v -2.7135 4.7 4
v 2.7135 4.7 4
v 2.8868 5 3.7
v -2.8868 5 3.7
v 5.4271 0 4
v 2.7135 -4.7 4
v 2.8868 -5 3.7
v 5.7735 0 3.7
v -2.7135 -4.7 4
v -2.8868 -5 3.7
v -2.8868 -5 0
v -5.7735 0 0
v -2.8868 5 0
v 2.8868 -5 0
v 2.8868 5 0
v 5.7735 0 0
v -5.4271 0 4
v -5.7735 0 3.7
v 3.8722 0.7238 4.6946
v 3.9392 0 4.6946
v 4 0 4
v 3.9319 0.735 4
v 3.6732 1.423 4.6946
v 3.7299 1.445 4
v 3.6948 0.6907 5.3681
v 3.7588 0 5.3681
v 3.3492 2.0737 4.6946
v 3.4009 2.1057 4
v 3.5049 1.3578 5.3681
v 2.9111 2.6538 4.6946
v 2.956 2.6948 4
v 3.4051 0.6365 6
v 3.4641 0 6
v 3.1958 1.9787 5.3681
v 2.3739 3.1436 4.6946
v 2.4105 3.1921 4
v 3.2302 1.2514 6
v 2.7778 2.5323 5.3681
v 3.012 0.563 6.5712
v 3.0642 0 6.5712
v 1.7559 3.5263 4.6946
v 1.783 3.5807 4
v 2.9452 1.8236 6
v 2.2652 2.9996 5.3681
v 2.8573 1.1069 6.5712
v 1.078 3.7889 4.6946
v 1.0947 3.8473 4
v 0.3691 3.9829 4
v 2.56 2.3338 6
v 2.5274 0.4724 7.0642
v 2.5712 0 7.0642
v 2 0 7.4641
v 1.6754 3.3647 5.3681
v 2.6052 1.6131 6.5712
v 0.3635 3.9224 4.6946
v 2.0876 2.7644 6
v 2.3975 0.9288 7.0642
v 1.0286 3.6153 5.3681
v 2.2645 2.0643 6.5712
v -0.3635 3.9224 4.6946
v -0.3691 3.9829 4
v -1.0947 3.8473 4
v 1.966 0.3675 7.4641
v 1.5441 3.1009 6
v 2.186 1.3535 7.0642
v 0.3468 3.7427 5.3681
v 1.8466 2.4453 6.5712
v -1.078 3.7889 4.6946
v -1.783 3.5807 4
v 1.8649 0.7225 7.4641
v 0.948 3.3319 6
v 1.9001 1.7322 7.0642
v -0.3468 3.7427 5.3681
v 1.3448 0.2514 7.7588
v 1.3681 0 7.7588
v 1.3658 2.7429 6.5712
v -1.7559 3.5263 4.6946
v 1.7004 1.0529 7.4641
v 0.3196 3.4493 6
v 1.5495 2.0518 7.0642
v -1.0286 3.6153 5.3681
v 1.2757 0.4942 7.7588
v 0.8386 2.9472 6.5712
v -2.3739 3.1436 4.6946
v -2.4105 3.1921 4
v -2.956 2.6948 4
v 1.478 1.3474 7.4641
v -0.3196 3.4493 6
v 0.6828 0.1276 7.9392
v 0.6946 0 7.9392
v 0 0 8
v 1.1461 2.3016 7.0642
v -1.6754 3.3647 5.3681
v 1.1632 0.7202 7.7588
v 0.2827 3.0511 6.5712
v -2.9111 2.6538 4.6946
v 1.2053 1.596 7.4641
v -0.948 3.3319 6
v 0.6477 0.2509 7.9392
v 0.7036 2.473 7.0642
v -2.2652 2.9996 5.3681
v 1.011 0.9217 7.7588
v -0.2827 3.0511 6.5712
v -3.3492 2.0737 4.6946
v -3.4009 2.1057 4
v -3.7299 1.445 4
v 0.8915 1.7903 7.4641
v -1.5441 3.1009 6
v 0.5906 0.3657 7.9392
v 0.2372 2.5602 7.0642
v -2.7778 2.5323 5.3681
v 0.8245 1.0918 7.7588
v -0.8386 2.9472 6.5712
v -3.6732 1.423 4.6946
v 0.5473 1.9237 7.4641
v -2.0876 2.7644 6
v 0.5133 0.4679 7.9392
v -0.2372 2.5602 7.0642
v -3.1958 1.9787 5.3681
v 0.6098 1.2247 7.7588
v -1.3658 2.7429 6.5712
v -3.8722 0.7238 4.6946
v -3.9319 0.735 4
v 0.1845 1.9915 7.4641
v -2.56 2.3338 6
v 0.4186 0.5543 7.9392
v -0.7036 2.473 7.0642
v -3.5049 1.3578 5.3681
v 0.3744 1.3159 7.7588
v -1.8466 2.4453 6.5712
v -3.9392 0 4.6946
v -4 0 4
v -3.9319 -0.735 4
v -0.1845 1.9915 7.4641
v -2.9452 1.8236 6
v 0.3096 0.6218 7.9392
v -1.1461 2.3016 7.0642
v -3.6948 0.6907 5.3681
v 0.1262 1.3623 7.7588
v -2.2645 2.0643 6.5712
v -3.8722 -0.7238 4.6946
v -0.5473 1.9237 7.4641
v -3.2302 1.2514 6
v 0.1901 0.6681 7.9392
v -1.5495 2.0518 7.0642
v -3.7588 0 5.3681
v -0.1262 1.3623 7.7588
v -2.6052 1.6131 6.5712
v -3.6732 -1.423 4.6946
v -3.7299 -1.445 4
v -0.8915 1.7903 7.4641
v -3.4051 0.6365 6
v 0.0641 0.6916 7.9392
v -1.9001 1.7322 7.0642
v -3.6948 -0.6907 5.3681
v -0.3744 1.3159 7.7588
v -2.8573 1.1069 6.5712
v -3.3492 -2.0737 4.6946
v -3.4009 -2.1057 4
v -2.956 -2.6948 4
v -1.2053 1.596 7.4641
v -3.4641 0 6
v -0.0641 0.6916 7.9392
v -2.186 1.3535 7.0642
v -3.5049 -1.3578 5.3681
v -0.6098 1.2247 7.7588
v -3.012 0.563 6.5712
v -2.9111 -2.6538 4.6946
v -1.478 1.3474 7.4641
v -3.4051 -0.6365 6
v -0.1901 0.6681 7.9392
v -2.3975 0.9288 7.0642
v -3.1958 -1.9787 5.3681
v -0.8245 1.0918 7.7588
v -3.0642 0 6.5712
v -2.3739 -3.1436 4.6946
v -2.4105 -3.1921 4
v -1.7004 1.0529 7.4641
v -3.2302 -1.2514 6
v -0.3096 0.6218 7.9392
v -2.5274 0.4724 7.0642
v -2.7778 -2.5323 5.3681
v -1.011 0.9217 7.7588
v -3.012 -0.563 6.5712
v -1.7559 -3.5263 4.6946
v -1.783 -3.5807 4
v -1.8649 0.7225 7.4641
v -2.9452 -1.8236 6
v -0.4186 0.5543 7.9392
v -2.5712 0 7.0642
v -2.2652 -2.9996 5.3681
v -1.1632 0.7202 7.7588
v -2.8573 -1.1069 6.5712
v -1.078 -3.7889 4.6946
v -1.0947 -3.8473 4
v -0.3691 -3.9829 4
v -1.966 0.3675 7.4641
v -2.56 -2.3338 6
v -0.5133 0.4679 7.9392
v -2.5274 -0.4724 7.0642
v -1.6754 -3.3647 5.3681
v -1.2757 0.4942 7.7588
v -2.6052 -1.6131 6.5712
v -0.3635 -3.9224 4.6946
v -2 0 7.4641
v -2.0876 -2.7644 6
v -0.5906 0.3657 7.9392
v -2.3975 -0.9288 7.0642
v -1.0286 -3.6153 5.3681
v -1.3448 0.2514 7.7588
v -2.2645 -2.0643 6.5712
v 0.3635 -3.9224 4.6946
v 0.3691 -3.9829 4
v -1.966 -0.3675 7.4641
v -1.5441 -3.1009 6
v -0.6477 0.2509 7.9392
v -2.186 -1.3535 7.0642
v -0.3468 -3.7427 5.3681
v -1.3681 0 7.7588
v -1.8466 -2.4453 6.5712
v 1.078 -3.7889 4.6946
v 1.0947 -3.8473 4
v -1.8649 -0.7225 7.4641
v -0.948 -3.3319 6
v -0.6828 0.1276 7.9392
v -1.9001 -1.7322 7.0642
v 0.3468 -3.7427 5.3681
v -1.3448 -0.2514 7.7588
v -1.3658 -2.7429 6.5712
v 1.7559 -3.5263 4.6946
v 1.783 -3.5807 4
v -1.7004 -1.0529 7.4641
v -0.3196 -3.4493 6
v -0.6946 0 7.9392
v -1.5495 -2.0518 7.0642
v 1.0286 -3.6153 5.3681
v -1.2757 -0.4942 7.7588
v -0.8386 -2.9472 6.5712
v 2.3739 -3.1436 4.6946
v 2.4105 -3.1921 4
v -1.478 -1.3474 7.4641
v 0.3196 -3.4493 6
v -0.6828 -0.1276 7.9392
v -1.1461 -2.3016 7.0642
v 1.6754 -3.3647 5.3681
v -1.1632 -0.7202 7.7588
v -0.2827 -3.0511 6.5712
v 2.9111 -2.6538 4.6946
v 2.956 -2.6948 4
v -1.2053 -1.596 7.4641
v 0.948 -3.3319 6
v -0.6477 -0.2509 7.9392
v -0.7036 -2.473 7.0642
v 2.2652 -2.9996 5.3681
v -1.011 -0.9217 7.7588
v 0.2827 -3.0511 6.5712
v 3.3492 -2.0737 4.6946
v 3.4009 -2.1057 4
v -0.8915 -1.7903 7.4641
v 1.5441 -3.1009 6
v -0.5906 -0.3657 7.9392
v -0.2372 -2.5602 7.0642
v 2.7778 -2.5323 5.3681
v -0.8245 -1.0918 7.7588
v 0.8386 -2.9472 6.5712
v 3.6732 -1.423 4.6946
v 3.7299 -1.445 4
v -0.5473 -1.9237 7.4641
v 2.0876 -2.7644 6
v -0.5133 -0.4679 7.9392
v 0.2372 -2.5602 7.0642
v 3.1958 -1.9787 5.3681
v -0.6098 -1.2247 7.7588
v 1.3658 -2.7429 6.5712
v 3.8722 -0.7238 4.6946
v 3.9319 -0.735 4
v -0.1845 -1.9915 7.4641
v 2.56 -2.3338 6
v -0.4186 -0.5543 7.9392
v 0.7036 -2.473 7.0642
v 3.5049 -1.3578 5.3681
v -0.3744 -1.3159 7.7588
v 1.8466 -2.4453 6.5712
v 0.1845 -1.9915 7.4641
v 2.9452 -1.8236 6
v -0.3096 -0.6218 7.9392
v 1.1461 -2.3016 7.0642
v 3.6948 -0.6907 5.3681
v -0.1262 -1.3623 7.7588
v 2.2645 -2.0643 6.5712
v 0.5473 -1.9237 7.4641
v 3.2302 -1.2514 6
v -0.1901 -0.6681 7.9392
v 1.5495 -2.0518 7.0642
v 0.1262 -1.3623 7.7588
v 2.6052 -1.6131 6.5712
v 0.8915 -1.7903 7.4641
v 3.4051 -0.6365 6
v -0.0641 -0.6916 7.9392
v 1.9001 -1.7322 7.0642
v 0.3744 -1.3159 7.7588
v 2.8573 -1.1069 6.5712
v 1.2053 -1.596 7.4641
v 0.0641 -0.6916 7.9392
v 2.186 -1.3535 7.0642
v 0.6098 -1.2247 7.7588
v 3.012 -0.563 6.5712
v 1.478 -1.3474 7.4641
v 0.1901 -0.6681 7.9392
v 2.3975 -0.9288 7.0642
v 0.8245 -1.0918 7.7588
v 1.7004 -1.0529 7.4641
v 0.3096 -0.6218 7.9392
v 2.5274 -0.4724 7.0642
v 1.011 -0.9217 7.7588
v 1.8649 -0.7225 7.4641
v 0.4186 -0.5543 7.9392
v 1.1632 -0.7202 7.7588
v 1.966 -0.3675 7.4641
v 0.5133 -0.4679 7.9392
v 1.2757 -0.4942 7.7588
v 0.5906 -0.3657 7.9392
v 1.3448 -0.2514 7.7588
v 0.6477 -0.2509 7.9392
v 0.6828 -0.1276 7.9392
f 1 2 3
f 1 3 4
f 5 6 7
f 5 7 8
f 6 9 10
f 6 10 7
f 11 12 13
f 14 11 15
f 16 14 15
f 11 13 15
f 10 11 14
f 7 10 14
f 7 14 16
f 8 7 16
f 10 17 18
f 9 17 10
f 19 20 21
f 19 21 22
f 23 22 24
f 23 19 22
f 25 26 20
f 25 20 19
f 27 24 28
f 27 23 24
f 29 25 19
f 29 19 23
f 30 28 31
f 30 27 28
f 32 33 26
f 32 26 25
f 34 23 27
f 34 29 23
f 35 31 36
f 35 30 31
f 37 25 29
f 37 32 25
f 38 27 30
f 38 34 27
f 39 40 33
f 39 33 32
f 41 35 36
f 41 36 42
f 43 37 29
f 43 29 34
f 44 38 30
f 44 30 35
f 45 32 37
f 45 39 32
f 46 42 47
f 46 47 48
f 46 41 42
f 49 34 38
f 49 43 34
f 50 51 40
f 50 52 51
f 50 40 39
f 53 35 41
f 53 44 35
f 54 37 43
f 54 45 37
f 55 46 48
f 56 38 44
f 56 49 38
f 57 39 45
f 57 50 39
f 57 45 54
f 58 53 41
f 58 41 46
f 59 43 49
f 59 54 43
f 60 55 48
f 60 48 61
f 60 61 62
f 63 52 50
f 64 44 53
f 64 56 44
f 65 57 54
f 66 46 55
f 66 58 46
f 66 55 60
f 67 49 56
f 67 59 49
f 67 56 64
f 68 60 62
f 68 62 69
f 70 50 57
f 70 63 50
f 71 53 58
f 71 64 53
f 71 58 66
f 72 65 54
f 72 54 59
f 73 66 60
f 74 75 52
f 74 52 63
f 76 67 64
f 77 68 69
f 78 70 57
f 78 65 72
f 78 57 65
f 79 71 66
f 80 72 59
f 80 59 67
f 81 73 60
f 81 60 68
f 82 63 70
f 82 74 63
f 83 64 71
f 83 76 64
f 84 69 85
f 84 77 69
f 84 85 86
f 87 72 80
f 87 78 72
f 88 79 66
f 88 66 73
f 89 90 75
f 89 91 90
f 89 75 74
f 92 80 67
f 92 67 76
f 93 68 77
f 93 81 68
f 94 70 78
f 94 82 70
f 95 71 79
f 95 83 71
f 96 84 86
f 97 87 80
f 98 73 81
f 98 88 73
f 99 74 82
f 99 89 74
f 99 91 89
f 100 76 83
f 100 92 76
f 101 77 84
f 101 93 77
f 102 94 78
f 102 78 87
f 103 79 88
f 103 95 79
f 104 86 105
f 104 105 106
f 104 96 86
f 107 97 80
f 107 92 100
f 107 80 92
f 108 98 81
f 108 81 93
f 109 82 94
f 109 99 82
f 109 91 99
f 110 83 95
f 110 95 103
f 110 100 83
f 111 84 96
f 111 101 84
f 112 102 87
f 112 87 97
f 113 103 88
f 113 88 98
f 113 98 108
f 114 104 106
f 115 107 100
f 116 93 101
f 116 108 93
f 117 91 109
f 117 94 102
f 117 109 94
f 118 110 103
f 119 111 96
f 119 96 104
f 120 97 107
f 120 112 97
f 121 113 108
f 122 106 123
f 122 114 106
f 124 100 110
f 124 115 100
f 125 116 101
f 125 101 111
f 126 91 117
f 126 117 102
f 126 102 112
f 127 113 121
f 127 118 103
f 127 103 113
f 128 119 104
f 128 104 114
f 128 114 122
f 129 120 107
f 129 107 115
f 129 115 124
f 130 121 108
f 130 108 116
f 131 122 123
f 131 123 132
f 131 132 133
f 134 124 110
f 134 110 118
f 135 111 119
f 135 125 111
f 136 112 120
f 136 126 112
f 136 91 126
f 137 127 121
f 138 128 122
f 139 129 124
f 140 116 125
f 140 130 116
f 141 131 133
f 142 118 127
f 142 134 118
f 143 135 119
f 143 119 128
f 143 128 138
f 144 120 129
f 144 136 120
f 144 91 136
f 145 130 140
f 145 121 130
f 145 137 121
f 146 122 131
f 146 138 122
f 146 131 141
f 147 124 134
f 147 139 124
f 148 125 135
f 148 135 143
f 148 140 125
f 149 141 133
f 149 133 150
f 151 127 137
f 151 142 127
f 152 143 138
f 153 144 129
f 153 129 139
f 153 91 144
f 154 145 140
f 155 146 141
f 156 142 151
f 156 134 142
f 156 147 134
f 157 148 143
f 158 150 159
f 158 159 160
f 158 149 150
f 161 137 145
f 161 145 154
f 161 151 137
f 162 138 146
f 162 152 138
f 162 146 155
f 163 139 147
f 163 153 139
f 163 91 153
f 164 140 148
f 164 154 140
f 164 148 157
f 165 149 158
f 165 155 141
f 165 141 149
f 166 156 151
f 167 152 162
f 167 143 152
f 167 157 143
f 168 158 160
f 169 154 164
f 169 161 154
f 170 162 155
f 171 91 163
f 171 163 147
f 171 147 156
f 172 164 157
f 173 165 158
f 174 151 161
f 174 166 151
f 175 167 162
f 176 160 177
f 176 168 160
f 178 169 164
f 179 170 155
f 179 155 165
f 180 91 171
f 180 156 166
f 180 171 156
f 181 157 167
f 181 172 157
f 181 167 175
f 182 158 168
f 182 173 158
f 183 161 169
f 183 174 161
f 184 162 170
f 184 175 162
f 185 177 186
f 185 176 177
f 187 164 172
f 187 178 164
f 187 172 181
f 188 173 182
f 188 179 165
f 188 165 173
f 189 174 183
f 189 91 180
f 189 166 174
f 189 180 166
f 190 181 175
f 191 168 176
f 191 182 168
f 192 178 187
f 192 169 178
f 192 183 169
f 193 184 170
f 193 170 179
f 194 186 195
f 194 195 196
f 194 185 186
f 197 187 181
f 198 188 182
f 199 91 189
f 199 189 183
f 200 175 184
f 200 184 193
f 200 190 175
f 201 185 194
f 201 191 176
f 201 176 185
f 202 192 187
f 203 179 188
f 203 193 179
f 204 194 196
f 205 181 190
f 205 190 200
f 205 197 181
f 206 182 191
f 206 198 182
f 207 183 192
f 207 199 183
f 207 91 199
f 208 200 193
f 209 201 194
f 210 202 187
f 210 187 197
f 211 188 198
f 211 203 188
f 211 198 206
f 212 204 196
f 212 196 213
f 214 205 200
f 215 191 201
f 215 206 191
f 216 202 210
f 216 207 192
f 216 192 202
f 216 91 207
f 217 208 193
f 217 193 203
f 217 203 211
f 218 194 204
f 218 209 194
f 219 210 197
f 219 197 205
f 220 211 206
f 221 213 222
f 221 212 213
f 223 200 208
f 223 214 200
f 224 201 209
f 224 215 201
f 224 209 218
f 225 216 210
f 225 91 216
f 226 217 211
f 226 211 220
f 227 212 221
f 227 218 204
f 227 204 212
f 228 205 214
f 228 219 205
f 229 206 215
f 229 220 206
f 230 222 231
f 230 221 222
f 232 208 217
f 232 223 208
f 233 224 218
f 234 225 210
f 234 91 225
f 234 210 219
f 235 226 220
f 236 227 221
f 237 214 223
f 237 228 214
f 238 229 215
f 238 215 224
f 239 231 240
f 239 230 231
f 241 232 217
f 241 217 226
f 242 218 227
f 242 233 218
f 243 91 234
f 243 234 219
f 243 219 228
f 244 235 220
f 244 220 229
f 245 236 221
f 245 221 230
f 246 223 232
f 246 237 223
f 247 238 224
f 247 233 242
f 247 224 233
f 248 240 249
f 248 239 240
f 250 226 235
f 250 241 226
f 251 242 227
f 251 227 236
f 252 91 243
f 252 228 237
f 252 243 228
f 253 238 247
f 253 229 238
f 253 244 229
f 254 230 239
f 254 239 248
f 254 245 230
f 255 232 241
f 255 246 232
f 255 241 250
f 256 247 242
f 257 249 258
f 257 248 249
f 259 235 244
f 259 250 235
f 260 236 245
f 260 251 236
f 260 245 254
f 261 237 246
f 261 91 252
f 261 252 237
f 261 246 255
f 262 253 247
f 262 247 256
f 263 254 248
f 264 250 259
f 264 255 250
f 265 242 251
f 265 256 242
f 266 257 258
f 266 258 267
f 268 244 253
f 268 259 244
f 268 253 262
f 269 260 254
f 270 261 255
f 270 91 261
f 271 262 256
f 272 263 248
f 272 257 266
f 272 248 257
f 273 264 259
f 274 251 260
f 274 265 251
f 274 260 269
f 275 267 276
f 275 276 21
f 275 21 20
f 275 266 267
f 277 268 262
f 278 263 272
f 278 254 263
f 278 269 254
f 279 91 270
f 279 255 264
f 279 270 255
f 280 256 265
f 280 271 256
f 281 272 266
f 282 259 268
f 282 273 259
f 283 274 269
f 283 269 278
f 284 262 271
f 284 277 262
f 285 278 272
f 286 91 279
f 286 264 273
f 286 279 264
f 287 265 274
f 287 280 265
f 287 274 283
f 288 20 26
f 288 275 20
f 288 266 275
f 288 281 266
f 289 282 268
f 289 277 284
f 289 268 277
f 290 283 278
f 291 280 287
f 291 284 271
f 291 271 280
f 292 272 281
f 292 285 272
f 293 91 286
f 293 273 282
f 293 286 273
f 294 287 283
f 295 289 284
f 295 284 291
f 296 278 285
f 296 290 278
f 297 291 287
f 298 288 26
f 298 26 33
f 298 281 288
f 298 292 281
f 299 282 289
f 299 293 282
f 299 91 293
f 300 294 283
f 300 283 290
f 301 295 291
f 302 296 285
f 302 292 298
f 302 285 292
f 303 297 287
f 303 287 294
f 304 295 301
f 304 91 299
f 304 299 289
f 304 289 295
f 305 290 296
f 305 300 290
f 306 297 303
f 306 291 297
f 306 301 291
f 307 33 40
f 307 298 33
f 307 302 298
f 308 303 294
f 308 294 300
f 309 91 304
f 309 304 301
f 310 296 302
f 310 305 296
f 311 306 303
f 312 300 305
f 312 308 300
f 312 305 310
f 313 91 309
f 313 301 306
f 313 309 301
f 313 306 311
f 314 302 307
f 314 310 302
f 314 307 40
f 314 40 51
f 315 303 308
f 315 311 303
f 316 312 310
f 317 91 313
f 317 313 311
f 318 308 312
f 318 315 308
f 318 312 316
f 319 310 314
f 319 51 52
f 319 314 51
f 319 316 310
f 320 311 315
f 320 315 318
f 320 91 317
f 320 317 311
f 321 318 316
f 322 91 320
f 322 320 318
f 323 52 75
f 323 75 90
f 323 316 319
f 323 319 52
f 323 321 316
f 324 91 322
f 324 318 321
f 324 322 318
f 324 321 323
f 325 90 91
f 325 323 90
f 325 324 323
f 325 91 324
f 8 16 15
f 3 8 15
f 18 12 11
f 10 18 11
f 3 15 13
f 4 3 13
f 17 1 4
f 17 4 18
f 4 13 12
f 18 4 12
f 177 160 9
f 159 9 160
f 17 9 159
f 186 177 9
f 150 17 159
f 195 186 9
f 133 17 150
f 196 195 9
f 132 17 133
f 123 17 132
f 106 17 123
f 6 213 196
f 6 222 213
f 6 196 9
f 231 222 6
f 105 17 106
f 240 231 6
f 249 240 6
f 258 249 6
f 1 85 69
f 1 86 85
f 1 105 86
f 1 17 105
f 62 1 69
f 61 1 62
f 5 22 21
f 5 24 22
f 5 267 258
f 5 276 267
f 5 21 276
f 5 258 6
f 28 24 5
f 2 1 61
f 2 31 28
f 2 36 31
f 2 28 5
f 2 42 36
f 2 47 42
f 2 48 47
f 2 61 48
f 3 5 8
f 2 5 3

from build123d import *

# Parameters (mm, degrees)
F1_DEPTH = 4
F2_SIZE  = 0.3
F3_R     = 4
F4_DEPTH = 4
F5_R     = 3.99999


# Not quite as in the source:
# - a fillet or chamfer is up to 0.001 mm smaller than in the source, because OpenCascade refuses the exact size


with BuildPart() as f1:
    # F0 (on Top) → F1 (new body)
    with BuildSketch(Plane.XY):
        Polygon((2.8867513459, 5), (-2.8867513459, 5), (-5.7735026919, 0), (-2.8867513459, -5), (2.8867513459, -5), (5.7735026919, 0), align=None)
    extrude(amount=F1_DEPTH)

    # F2
    f2_edges = [f1.edges().sort_by_distance(p)[0] for p in [
        (4.330127, -2.5, 4),
        (0, -5, 4),
        (4.330127, 2.5, 4),
        (-4.330127, -2.5, 4),
        (-4.330127, 2.5, 4),
        (0, 5, 4),
    ]]
    chamfer(f2_edges, length=F2_SIZE)

    # F3 (on face) → F4 (join)
    with BuildSketch(Plane.XY.offset(4)):
        Circle(F3_R)
    extrude(amount=F4_DEPTH)

    # F5 (radius 4 in the source; OpenCascade refuses exactly that, so slightly less here)
    f5_edges = [f1.edges().sort_by_distance(p)[0] for p in [
        (-4, 0, 8),
    ]]
    fillet(f5_edges, radius=F5_R)


solid = f1.part
